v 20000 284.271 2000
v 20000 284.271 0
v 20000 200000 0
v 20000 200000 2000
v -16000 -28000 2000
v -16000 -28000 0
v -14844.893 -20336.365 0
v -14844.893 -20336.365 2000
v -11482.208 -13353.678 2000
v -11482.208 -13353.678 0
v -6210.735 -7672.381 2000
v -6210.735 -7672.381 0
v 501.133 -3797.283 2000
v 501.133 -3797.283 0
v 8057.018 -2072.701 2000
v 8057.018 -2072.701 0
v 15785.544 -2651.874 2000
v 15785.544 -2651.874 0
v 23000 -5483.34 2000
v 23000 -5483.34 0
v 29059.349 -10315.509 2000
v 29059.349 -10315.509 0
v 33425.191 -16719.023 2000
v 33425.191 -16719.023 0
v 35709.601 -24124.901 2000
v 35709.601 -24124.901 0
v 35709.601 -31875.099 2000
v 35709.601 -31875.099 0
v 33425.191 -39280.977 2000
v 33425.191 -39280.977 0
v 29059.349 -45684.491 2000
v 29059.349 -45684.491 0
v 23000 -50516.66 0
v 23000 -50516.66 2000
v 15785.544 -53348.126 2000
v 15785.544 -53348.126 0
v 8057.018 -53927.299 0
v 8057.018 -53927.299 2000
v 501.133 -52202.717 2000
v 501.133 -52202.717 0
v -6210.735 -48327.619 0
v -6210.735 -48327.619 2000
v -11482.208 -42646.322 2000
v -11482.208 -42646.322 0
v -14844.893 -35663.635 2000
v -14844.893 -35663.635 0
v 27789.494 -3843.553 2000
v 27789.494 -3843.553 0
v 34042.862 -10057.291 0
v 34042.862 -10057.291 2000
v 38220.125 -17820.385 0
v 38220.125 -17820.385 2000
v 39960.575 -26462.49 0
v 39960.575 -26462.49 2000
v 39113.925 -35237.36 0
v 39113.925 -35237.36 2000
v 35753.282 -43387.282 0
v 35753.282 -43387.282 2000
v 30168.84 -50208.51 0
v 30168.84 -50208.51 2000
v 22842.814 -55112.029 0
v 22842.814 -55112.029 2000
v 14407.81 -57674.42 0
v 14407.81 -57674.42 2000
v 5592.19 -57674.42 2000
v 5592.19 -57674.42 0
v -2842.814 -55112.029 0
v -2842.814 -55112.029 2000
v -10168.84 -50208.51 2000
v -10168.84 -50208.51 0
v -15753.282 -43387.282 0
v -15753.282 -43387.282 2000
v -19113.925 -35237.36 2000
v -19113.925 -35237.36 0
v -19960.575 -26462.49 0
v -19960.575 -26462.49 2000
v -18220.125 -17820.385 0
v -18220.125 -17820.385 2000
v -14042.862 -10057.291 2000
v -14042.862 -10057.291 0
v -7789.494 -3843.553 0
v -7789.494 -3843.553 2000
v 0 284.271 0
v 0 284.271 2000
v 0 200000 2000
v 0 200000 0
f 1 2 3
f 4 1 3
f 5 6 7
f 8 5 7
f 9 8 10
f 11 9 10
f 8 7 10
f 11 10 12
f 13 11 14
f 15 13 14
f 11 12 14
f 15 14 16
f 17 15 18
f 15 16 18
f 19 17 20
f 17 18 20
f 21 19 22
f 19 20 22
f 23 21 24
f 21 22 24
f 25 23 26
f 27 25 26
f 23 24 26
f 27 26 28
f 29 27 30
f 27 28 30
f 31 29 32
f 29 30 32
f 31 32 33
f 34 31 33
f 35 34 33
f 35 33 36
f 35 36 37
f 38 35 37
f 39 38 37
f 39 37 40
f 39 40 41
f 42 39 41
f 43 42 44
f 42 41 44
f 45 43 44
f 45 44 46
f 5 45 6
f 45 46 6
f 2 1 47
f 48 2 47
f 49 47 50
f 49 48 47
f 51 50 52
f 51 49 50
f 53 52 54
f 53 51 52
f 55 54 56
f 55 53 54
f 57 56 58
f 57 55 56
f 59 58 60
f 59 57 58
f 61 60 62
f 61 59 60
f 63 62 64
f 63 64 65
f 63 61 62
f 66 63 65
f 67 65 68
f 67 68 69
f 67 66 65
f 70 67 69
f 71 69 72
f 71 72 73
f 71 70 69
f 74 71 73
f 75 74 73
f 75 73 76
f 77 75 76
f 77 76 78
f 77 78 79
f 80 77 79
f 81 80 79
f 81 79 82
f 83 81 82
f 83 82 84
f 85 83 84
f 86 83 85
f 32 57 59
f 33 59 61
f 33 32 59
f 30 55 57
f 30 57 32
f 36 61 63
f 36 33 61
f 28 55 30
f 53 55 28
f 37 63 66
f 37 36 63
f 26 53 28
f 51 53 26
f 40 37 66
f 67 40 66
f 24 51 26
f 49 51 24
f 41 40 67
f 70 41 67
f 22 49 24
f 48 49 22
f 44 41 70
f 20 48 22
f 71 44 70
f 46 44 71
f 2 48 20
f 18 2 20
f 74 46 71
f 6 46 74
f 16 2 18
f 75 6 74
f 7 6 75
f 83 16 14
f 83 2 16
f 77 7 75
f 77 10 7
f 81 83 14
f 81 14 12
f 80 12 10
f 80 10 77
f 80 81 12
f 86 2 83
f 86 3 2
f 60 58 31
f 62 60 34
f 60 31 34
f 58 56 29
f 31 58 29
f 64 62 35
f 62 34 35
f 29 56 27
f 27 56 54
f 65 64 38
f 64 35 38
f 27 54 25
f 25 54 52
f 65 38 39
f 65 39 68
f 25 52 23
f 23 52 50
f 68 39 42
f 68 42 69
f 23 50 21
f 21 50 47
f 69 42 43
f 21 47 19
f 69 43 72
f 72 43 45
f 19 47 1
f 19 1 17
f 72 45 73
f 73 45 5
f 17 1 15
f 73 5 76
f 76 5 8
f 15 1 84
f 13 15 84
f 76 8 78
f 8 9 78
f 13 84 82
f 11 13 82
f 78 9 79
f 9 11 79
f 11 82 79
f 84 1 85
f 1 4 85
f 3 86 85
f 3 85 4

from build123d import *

# Parameters (mm, degrees)
SKETCH1_W           = 20000
SKETCH1_H           = 200000
BOSS_EXTRUDE1_DEPTH = 2000
SKETCH3_R           = 30000
SKETCH3_R_2         = 26000
BOSS_EXTRUDE3_DEPTH = 2000


with BuildPart() as part:
    # Sketch1 → Boss-Extrude1 (new body)
    with BuildSketch(Plane.XY):
        with Locations((10000, 100000)):
            Rectangle(SKETCH1_W, SKETCH1_H)
    extrude(amount=BOSS_EXTRUDE1_DEPTH)

    # Sketch3 → Boss-Extrude3 (add)
    with BuildSketch(Plane(origin=(0, 0, 0), x_dir=(-1, 0, 0), z_dir=(0, 0, -1))):
        with Locations((-10000, -28000)):
            Circle(SKETCH3_R)
        with Locations((-10000, -28000)):
            Circle(SKETCH3_R_2, mode=Mode.SUBTRACT)
    extrude(amount=-BOSS_EXTRUDE3_DEPTH)


solid = part.part
